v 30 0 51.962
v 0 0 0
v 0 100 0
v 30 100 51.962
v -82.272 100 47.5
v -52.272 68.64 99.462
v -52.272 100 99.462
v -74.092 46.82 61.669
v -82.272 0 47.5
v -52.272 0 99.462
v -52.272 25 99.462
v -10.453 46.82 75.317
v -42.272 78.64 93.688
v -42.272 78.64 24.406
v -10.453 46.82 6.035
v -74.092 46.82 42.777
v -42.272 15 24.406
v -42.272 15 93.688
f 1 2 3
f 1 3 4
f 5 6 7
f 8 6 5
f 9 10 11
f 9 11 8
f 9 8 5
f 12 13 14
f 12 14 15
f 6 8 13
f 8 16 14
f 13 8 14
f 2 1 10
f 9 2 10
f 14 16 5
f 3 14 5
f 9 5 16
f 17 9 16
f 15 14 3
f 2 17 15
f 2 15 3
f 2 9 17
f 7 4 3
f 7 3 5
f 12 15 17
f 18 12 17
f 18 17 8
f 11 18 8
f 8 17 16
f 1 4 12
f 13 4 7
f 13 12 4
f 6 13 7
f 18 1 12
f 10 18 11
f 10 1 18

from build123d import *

# Parameters (mm, degrees)
EXTRUDE1_DEPTH     = 100
CUT_EXTRUDE1_DEPTH = 100.461524227


with BuildPart() as part:
    # Sketch1 → Extrude1 (new body)
    with BuildSketch(Plane(origin=(0, 0, 0), x_dir=(1, 0, 0), z_dir=(0, 1, 0))):
        Polygon((0, 0), (30, -51.961524227), (-52.27241336, -99.461524227), (-82.27241336, -47.5), align=None)
    extrude(amount=EXTRUDE1_DEPTH)

    # Sketch2 → Cut-Extrude1 (cut, through all)
    with BuildSketch(Plane.XY):
        Polygon((-42.27241336, 78.639610307), (-10.452608206, 46.819805153), (-42.27241336, 15), (-74.092218513, 46.819805153), align=None)
    extrude(amount=CUT_EXTRUDE1_DEPTH, mode=Mode.SUBTRACT)


solid = part.part
